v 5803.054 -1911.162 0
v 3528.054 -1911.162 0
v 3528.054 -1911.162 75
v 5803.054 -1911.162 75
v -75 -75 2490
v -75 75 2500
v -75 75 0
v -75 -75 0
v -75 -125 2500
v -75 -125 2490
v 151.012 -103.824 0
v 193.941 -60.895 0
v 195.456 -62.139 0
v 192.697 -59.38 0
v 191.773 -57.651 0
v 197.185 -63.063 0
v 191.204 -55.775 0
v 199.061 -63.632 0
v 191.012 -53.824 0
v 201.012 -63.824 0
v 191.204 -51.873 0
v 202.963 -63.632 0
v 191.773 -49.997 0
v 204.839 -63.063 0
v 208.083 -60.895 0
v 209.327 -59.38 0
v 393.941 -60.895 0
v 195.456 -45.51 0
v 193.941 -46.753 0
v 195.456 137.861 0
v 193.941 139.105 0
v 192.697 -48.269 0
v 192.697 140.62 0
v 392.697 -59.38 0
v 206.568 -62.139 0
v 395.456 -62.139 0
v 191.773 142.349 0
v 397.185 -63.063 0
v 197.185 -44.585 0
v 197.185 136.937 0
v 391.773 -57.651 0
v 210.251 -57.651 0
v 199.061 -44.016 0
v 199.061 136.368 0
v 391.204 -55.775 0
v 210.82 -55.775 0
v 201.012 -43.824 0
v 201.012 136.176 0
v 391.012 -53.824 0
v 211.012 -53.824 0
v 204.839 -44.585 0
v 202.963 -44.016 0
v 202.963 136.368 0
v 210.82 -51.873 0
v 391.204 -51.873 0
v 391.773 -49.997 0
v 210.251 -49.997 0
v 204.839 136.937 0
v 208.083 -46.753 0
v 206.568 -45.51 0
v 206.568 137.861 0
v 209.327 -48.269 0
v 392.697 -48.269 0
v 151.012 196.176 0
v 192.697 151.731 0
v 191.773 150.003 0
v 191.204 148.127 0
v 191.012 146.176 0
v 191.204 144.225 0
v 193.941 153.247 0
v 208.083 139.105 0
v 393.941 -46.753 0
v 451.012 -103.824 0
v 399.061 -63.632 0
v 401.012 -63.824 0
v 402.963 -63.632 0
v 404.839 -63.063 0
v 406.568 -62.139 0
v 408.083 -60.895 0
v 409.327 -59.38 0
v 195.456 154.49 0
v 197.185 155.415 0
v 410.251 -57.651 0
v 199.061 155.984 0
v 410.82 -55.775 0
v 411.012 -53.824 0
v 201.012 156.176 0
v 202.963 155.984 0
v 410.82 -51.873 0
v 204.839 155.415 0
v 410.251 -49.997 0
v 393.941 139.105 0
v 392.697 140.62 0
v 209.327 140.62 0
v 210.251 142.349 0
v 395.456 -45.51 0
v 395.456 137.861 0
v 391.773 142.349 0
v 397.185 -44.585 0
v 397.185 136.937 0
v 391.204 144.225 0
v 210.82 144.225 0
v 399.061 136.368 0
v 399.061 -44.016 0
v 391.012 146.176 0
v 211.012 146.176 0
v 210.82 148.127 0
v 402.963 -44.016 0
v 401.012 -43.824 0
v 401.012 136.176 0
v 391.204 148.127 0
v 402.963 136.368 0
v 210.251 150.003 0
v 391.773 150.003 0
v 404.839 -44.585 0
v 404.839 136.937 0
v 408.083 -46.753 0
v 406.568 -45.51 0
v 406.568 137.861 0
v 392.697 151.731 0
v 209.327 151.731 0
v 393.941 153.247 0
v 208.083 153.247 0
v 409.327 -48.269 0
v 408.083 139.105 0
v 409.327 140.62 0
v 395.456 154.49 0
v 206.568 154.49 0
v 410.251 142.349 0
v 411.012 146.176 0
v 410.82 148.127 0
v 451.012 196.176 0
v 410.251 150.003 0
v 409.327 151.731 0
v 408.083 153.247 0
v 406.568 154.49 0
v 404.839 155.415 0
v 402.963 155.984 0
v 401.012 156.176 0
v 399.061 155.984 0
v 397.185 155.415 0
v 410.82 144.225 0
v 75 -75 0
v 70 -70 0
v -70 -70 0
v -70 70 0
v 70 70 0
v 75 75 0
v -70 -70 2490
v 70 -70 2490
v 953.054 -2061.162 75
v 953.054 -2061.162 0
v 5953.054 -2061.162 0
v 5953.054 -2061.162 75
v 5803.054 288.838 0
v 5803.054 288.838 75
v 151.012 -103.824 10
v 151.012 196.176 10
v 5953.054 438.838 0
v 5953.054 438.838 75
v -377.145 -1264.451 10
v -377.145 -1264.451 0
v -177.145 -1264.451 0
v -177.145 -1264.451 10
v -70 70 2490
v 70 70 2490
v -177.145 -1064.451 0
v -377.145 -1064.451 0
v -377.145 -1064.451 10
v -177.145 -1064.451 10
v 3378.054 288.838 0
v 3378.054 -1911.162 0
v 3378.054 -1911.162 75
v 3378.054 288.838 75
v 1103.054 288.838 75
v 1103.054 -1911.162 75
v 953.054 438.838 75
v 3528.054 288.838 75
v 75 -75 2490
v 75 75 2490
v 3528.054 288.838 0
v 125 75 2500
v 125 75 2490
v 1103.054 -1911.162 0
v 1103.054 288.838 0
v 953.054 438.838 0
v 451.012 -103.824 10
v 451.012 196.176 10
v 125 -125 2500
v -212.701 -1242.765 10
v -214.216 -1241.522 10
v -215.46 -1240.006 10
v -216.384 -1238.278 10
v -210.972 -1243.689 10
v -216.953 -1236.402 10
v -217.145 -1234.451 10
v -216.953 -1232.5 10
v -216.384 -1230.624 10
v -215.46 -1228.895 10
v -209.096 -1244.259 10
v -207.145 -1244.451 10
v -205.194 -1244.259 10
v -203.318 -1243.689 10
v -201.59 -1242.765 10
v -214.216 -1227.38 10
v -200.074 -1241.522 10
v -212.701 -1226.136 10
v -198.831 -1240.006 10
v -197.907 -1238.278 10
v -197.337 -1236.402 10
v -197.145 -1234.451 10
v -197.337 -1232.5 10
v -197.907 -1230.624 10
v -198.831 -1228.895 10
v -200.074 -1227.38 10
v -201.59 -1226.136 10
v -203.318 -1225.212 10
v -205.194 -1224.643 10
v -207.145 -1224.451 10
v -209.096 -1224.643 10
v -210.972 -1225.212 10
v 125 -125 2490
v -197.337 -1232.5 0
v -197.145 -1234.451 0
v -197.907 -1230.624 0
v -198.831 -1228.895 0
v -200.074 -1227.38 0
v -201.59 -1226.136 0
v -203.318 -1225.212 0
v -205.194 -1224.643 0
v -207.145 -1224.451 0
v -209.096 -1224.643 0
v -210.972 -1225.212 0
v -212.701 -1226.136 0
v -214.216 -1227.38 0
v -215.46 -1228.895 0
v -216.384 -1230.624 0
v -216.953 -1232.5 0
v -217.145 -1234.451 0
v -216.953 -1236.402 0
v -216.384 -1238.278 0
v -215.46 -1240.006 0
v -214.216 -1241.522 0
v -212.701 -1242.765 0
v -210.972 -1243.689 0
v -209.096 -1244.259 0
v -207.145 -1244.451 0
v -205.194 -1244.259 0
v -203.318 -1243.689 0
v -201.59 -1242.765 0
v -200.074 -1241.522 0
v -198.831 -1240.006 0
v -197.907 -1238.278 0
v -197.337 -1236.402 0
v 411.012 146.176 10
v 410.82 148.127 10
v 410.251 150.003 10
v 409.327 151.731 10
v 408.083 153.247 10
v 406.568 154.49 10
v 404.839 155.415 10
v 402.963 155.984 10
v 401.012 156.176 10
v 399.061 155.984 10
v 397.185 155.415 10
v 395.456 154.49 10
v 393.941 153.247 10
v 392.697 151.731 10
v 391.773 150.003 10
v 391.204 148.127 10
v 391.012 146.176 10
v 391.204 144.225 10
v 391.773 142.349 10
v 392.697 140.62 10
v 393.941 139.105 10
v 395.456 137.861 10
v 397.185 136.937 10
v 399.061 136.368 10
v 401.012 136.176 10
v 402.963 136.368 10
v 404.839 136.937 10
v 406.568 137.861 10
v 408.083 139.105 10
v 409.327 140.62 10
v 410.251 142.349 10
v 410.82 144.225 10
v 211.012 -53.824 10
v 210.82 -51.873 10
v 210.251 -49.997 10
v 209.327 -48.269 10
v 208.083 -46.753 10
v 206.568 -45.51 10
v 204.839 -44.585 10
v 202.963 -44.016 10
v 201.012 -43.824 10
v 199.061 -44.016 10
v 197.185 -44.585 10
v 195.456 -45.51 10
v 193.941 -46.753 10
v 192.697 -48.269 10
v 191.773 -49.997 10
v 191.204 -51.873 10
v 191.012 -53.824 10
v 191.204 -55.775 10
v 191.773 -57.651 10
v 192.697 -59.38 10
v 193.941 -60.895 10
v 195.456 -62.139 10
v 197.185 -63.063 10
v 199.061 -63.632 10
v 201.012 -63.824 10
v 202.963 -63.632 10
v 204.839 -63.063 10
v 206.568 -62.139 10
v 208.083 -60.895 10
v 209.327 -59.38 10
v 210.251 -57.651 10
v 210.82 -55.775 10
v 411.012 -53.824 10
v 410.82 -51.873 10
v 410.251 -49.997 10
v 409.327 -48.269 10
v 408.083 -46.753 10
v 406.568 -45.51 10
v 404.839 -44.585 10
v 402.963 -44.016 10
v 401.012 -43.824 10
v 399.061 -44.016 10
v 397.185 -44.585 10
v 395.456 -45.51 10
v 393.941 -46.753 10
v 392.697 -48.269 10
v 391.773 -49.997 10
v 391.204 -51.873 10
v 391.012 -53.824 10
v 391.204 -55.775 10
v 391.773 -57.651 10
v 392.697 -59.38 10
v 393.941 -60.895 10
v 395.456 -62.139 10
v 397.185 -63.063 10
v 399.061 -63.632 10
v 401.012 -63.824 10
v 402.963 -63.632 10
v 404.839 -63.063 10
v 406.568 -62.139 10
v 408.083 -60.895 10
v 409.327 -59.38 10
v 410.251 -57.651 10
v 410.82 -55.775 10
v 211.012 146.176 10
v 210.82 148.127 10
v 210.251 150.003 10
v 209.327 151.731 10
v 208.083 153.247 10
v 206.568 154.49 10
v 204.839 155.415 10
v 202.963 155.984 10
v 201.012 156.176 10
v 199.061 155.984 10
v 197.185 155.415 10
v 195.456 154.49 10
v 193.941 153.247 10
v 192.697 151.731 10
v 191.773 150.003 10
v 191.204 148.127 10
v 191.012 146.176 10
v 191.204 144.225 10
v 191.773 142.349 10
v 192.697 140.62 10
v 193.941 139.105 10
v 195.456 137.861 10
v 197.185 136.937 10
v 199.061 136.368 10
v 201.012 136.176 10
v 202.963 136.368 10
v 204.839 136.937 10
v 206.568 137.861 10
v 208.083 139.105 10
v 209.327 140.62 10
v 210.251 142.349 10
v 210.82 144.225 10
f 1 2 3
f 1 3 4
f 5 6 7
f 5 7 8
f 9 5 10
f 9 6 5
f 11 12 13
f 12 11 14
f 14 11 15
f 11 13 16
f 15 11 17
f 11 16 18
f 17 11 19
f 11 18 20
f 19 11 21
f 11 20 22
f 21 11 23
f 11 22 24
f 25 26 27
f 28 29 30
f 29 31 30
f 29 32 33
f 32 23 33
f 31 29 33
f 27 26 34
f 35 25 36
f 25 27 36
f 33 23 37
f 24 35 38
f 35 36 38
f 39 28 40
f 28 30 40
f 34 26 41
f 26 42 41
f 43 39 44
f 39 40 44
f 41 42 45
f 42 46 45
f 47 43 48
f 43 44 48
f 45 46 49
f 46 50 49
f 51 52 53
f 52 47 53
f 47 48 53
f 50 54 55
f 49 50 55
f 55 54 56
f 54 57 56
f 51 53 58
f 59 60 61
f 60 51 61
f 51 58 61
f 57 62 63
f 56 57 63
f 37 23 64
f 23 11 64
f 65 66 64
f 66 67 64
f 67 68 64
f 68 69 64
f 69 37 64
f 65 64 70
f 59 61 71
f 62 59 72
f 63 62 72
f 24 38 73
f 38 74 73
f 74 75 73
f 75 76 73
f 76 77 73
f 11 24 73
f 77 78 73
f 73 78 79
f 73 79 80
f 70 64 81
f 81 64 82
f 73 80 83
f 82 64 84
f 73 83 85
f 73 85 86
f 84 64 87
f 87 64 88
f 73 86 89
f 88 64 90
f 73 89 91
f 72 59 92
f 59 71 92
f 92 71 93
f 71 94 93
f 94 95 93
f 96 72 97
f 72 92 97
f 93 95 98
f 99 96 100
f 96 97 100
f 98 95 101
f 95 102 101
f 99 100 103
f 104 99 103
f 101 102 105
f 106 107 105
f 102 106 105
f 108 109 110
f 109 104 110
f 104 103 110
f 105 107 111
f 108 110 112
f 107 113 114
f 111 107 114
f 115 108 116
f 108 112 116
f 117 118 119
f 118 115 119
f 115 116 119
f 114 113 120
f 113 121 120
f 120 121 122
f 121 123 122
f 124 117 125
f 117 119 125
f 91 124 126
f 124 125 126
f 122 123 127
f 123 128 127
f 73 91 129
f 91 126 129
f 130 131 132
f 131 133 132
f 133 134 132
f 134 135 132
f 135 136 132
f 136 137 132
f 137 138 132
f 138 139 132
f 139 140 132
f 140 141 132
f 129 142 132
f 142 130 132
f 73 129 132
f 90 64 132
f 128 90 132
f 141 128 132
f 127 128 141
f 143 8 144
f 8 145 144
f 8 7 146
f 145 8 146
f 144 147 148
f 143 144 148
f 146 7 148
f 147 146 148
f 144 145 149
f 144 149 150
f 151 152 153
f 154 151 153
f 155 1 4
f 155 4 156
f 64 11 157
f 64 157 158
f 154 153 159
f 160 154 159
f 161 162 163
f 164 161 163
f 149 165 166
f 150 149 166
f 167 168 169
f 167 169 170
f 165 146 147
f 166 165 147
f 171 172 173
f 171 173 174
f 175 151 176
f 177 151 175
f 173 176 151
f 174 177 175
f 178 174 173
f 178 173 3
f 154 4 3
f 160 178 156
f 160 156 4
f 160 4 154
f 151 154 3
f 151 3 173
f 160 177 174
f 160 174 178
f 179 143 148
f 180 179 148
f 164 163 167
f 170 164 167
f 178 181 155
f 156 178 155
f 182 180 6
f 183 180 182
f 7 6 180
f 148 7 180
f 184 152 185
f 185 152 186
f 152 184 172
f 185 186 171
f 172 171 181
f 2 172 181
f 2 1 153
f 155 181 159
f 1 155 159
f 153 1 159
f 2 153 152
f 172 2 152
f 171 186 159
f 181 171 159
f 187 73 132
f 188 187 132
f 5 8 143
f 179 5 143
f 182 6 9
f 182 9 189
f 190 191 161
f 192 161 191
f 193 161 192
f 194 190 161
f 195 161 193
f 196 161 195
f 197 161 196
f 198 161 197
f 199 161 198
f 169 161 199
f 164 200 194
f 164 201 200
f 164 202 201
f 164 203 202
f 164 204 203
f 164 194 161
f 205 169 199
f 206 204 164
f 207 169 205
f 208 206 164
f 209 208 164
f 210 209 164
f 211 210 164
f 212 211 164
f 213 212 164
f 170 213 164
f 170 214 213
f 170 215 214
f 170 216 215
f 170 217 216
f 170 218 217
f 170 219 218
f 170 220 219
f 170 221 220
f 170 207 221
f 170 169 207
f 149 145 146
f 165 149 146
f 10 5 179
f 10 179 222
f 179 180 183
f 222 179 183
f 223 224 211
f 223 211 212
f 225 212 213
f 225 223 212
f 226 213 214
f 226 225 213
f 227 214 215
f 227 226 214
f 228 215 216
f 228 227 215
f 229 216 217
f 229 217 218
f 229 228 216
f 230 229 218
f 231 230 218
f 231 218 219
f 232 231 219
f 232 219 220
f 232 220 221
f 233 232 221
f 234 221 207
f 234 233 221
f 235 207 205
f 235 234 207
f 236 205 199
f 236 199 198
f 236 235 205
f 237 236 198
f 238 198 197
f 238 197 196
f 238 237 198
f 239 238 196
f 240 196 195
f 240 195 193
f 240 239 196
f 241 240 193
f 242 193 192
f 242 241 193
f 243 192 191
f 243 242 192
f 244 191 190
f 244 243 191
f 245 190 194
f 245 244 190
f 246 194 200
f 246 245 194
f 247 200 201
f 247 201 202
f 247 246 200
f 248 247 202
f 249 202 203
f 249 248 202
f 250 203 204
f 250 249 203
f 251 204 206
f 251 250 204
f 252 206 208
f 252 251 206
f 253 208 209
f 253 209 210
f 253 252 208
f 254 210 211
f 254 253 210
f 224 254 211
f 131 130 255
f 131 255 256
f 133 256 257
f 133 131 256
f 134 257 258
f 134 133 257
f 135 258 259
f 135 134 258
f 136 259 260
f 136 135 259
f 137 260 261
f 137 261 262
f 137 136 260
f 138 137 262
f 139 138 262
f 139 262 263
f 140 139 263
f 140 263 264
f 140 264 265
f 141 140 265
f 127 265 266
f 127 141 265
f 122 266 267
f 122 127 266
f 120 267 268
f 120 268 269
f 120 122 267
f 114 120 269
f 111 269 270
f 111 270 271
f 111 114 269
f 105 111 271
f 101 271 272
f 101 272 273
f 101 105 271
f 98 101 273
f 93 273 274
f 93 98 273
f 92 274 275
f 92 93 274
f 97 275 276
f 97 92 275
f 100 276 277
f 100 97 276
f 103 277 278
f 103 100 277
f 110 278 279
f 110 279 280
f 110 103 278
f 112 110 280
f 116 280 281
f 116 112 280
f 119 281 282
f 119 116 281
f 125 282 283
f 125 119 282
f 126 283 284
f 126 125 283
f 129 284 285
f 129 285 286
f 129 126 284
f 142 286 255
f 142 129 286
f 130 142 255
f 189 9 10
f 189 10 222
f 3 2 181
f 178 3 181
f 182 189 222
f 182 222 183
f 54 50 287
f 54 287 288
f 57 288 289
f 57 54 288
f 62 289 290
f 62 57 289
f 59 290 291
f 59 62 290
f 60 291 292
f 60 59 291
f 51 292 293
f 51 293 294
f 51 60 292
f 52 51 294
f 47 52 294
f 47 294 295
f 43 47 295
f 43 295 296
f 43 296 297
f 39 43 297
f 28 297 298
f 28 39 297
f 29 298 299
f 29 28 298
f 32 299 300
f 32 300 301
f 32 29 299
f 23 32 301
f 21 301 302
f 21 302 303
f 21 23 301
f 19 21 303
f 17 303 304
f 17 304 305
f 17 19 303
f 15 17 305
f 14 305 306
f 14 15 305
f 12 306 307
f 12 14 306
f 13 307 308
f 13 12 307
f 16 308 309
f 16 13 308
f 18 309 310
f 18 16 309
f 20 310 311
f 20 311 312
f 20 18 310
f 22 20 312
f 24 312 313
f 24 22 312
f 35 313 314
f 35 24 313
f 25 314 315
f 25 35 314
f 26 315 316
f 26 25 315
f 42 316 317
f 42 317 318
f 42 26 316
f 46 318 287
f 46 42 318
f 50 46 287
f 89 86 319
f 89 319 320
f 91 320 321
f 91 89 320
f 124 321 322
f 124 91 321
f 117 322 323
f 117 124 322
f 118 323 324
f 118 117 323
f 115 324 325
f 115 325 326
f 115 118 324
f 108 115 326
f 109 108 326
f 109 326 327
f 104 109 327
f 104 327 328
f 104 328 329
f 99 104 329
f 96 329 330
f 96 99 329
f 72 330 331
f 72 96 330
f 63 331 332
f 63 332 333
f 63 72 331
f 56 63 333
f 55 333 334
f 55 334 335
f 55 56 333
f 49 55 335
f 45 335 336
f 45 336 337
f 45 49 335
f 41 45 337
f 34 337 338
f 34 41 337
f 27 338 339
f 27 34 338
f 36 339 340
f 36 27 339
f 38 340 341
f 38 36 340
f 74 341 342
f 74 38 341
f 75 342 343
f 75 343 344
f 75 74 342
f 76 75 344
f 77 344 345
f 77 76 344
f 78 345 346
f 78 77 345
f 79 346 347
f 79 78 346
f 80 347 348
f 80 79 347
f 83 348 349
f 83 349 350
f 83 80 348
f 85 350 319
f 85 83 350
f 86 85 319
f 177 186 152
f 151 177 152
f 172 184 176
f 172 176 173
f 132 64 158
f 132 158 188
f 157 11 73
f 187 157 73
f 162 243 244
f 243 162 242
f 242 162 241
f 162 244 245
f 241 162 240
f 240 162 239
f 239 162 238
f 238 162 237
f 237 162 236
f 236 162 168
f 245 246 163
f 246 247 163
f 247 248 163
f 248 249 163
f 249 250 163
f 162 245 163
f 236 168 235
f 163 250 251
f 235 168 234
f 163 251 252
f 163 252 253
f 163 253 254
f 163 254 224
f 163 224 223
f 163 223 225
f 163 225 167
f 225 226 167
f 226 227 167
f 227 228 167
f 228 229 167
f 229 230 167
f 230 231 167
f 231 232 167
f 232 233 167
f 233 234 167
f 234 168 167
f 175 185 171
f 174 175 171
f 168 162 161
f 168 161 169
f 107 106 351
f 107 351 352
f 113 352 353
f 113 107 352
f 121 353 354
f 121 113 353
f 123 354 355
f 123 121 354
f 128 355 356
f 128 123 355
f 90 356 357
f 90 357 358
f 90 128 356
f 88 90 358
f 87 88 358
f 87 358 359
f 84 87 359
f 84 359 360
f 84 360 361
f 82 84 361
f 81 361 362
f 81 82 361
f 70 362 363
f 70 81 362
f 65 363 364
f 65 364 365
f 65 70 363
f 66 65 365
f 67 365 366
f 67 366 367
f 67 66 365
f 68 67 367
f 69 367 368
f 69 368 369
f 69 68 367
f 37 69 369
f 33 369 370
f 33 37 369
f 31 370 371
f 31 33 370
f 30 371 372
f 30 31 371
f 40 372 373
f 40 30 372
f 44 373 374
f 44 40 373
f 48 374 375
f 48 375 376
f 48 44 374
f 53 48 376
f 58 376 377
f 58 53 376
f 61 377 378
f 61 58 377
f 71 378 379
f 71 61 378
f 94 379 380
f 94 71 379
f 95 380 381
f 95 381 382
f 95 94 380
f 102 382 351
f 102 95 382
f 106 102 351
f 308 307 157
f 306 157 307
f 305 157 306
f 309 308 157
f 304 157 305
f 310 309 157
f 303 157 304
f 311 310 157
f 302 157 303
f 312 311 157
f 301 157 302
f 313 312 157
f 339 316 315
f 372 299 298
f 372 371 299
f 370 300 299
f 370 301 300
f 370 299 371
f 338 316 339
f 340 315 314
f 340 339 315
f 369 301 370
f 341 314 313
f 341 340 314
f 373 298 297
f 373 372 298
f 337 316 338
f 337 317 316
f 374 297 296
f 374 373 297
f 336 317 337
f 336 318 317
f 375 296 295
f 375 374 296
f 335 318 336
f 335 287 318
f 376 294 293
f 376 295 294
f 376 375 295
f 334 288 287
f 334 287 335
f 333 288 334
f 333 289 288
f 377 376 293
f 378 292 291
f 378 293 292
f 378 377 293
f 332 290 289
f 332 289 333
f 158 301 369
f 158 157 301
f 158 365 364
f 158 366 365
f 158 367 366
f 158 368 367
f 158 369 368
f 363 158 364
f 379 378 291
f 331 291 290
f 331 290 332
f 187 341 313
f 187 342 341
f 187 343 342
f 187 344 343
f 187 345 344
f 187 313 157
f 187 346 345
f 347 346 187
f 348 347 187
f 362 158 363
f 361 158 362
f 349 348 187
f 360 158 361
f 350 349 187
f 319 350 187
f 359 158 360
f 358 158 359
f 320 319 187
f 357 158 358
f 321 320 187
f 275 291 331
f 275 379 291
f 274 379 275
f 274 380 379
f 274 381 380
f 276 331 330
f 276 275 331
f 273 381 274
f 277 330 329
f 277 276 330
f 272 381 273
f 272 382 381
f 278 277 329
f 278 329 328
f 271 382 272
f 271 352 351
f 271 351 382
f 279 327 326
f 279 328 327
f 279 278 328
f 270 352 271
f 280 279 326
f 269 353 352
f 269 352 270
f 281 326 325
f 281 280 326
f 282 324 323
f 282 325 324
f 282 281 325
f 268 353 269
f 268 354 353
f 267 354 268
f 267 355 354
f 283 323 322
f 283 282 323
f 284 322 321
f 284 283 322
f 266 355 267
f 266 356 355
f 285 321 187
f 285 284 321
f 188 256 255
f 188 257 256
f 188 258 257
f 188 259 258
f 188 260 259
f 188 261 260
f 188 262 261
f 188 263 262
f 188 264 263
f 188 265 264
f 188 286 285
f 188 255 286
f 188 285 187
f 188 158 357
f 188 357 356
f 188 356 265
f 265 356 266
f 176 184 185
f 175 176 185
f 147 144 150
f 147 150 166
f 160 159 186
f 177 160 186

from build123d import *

# Parameters (mm, degrees)
F0_W     = 150
F0_H     = 150
F0_W_2   = 140
F0_H_2   = 140
F1_DEPTH = 2500
F0_W_3   = 300
F0_H_3   = 300
F0_R     = 10
F2_DEPTH = 10
F0_W_4   = 2275
F0_H_4   = 2200
F3_DEPTH = 75
F0_W_5   = 200
F0_H_5   = 200
F4_DEPTH = 10
F5_W     = 140
F5_H     = 140
F6_DEPTH = 10


with BuildPart() as f1:
    # F0 (on Top) → F1 (new body)
    with BuildSketch(Plane.XY):
        Rectangle(F0_W, F0_H)
        Rectangle(F0_W_2, F0_H_2, mode=Mode.SUBTRACT)
    extrude(amount=F1_DEPTH)

    # F5 (on face) → F6 (join)
    with BuildSketch(Plane.XY.offset(2500)):
        Polygon((75, -75), (-75, -75), (-75, -125), (125, -125), (125, 75), (75, 75), align=None)
        Rectangle(F5_W, F5_H)
    extrude(amount=-F6_DEPTH)


with BuildPart() as f2:
    # F0 (on Top) → F2 (new body)
    with BuildSketch(Plane.XY):
        with Locations((301.0120630264, 46.1757794023)):
            Rectangle(F0_W_3, F0_H_3)
        with Locations((201.0120630264, -53.8242205977)):
            Circle(F0_R, mode=Mode.SUBTRACT)
        with Locations((401.0120630264, -53.8242205977)):
            Circle(F0_R, mode=Mode.SUBTRACT)
        with Locations((201.0120630264, 146.1757794023)):
            Circle(F0_R, mode=Mode.SUBTRACT)
        with Locations((401.0120630264, 146.1757794023)):
            Circle(F0_R, mode=Mode.SUBTRACT)
    extrude(amount=F2_DEPTH)


with BuildPart() as f3:
    # F0 (on Top) → F3 (new body)
    with BuildSketch(Plane.XY):
        Polygon((1103.0536727687, 438.8376543754), (953.0536727687, 438.8376543754), (953.0536727687, -2061.1623456246), (5953.0536727687, -2061.1623456246), (5953.0536727687, 438.8376543754), (5803.0536727687, 438.8376543754), (3528.0536727687, 438.8376543754), (3378.0536727687, 438.8376543754), align=None)
        with Locations((2240.5536727687, -811.1623456246)):
            Rectangle(F0_W_4, F0_H_4, mode=Mode.SUBTRACT)
        with Locations((4665.5536727687, -811.1623456246)):
            Rectangle(F0_W_4, F0_H_4, mode=Mode.SUBTRACT)
    extrude(amount=F3_DEPTH)


with BuildPart() as f4:
    # F0 (on Top) → F4 (new body)
    with BuildSketch(Plane.XY):
        with Locations((-277.1453201771, -1164.4506692886)):
            Rectangle(F0_W_5, F0_H_5)
        with Locations((-207.1453201771, -1234.4506692886)):
            Circle(F0_R, mode=Mode.SUBTRACT)
    extrude(amount=F4_DEPTH)


solid = Compound([f1.part, f2.part, f3.part, f4.part])
